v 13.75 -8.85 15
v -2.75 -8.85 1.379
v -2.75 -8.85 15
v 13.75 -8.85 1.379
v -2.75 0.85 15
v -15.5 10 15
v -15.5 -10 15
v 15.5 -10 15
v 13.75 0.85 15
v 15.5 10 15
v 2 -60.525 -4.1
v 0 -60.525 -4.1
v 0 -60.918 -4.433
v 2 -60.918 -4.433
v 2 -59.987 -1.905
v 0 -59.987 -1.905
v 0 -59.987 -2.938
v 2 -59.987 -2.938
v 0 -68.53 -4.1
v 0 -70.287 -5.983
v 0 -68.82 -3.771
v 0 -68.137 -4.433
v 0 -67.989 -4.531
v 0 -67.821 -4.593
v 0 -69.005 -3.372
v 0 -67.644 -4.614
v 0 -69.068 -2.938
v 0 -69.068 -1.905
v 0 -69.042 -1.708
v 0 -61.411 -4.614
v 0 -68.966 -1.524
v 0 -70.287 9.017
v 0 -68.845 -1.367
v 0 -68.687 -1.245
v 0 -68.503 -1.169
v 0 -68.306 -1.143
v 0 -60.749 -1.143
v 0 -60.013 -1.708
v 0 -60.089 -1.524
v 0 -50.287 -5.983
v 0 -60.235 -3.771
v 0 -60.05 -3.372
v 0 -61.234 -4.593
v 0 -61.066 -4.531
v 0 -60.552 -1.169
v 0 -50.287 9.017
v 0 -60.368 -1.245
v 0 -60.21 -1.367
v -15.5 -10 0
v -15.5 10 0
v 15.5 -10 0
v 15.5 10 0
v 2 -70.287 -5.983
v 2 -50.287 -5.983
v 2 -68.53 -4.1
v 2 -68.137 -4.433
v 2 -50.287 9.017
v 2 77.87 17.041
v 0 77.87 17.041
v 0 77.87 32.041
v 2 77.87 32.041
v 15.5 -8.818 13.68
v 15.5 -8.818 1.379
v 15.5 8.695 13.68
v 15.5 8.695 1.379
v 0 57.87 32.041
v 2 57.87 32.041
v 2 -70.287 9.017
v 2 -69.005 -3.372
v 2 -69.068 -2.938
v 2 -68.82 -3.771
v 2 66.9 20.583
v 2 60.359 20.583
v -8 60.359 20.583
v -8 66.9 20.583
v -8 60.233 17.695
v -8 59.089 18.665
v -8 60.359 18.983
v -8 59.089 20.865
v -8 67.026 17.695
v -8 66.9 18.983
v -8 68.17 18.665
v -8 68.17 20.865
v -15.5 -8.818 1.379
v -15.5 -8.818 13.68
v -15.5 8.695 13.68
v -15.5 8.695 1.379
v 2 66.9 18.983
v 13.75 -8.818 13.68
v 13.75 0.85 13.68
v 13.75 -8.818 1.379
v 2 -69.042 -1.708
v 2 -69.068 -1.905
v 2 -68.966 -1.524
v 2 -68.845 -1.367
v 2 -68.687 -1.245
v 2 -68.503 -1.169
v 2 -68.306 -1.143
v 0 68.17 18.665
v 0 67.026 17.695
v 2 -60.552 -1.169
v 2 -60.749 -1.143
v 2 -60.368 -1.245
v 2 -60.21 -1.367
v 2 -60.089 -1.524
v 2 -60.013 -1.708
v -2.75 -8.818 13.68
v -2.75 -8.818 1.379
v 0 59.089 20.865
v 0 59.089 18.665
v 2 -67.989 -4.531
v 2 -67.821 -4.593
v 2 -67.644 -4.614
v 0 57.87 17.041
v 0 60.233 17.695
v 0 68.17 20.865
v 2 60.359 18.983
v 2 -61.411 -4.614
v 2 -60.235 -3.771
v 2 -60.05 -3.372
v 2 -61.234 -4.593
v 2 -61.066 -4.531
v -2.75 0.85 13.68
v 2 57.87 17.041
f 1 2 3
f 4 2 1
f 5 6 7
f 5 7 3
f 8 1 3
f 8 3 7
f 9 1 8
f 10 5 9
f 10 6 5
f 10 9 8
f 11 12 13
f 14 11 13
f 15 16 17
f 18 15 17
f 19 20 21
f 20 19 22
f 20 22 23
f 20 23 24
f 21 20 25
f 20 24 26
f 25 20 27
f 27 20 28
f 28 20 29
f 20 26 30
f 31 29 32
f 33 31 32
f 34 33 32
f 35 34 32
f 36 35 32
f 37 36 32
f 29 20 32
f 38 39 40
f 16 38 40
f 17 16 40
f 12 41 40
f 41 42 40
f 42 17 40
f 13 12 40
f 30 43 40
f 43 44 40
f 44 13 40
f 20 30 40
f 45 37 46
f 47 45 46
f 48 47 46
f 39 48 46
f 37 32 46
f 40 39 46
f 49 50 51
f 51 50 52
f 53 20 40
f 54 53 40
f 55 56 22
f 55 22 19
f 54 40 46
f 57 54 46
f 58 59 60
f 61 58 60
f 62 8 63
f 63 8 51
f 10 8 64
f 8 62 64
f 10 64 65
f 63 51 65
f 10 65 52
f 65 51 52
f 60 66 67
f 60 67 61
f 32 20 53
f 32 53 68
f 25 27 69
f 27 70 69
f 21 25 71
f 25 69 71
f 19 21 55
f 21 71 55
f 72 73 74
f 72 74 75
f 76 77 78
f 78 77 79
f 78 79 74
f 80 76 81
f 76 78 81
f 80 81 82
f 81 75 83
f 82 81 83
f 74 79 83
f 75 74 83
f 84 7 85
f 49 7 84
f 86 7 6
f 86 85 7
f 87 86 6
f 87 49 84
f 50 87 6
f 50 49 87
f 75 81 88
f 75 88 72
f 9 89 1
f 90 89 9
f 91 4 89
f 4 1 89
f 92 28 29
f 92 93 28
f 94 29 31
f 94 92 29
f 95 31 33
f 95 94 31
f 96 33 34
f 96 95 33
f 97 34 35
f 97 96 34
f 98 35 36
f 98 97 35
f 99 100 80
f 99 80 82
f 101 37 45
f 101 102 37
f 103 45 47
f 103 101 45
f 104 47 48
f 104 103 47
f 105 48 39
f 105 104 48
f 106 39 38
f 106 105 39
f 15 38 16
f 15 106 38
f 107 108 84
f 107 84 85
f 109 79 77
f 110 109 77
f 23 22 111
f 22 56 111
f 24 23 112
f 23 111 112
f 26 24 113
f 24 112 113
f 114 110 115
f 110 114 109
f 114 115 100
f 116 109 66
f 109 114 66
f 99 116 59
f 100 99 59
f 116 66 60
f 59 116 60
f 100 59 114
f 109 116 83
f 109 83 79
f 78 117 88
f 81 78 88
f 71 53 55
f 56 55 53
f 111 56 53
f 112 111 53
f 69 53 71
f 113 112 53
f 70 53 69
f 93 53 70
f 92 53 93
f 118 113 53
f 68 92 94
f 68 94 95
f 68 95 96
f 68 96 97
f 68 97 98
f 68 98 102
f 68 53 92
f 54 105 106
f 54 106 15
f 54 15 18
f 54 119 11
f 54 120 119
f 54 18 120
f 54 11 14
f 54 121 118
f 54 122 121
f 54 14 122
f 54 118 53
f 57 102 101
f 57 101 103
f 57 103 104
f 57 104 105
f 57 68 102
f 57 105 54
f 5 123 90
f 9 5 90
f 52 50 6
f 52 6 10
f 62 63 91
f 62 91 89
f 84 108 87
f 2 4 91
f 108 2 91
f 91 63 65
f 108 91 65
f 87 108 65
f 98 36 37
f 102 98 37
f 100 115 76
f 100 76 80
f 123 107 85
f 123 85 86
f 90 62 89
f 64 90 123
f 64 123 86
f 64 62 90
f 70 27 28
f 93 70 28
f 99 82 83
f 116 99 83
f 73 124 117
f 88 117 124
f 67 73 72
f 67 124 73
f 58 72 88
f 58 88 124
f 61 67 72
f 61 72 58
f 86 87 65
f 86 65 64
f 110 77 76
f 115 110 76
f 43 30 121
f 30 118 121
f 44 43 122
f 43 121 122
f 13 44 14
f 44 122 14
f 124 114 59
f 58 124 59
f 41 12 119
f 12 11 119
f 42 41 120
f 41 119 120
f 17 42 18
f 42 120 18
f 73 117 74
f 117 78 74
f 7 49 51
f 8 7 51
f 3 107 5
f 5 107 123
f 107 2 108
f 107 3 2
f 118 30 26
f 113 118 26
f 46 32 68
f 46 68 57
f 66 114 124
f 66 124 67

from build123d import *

# Parameters (mm, degrees)
F0_W           = 31
F0_H           = 20
F0_W_2         = 16.5
F0_H_2         = 9.7
F1_DEPTH       = 15
F2_W           = 17.5128383562
F2_H           = 12.3006843496
F3_DEPTH       = 31
F4_W           = 20
F4_H           = 15
F5_DEPTH       = 2
F6_DEPTH       = 15.501
F7_R           = 1.524
F8_R           = 0.762
F9_W           = 20
F9_H           = 15
F10_DEPTH      = 2
F11_R          = 1.524
F12_R          = 0.508
F9_W_2         = 6.5408784162
F9_H_2         = 1.6
F13_DEPTH      = 8
F13_DEPTH_BACK = 2
F14_DEPTH      = 1.3791888487


with BuildPart() as f1:
    # F0 (on Top) → F1 (new body)
    with BuildSketch(Plane.XY):
        Rectangle(F0_W, F0_H)
        with Locations((5.5, -4)):
            Rectangle(F0_W_2, F0_H_2, mode=Mode.SUBTRACT)
    extrude(amount=F1_DEPTH)

    # F2 (on face) → F3 (cut, through all)
    with BuildSketch(Plane.YZ.offset(15.5)):
        with Locations((-0.0618002377, 7.5295310235)):
            Rectangle(F2_W, F2_H)
    extrude(amount=-F3_DEPTH, mode=Mode.SUBTRACT)

    # F4 (on Right) → F6 (cut, through all)
    with BuildSketch(Plane.YZ):
        Polygon((-59.9870646918, -3.6433568521), (-59.9870646918, -1.1433568521), (-69.0679431081, -1.1433568521), (-69.0679431081, -3.6433568521), (-67.9240242911, -4.6136401819), (-61.1309835089, -4.6136401819), align=None)
    extrude(amount=-F6_DEPTH, mode=Mode.SUBTRACT)

    # F0 (on Top) → F14 (join, through all)
    with BuildSketch(Plane.XY):
        with Locations((5.5, -4)):
            Rectangle(F0_W_2, F0_H_2)
    extrude(amount=F14_DEPTH)


with BuildPart() as f5:
    # F4 (on Right) → F5 (new body)
    with BuildSketch(Plane.YZ):
        with Locations((-60.2870646918, 1.5166431479)):
            Rectangle(F4_W, F4_H)
        Polygon((-69.0679431081, -1.1433568521), (-59.9870646918, -1.1433568521), (-59.9870646918, -3.6433568521), (-61.1309835089, -4.6136401819), (-67.9240242911, -4.6136401819), (-69.0679431081, -3.6433568521), align=None, mode=Mode.SUBTRACT)
    extrude(amount=F5_DEPTH)

    # F7
    f7_edges = [f5.edges().sort_by_distance(p)[0] for p in [
        (1, -59.987065, -3.643357),
        (1, -69.067943, -3.643357),
    ]]
    fillet(f7_edges, radius=F7_R)

    # F8
    f8_edges = [f5.edges().sort_by_distance(p)[0] for p in [
        (1, -59.987065, -1.143357),
        (1, -69.067943, -1.143357),
        (1, -61.130984, -4.61364),
        (1, -67.924024, -4.61364),
    ]]
    fillet(f8_edges, radius=F8_R)


with BuildPart() as f10:
    # F9 (on Right) → F10 (new body)
    with BuildSketch(Plane.YZ):
        with Locations((67.8698294036, 24.5409083115)):
            Rectangle(F9_W, F9_H)
        Polygon((66.8998294036, 20.8654734174), (68.1698294036, 20.8654734174), (68.1698294036, 18.6654734174), (67.0259105866, 17.6951900876), (60.2328698044, 17.6951900876), (59.0889509874, 18.6654734174), (59.0889509874, 20.8654734174), (60.3589509874, 20.8654734174), align=None, mode=Mode.SUBTRACT)
    extrude(amount=F10_DEPTH)

    # F11
    f11_edges = [f10.edges().sort_by_distance(p)[0] for p in [
        (1, 68.169829, 18.665473),
        (1, 59.088951, 18.665473),
    ]]
    fillet(f11_edges, radius=F11_R)

    # F12
    f12_edges = [f10.edges().sort_by_distance(p)[0] for p in [
        (1, 68.169829, 20.865473),
        (1, 59.088951, 20.865473),
    ]]
    fillet(f12_edges, radius=F12_R)

    # F9 (on Right) → F13 (join, two sides)
    with BuildSketch(Plane.YZ) as f13_sk:
        Polygon((68.1698294036, 18.6654734174), (68.1698294036, 20.8654734174), (66.8998294036, 20.8654734174), (60.3589509874, 20.8654734174), (59.0889509874, 20.8654734174), (59.0889509874, 18.6654734174), (60.2328698044, 17.6951900876), (67.0259105866, 17.6951900876), align=None)
        with Locations((63.6293901955, 19.7831424505)):
            Rectangle(F9_W_2, F9_H_2, mode=Mode.SUBTRACT)
    extrude(amount=-F13_DEPTH)
    extrude(f13_sk.sketch, amount=F13_DEPTH_BACK)


solid = Compound([f1.part, f5.part, f10.part])
